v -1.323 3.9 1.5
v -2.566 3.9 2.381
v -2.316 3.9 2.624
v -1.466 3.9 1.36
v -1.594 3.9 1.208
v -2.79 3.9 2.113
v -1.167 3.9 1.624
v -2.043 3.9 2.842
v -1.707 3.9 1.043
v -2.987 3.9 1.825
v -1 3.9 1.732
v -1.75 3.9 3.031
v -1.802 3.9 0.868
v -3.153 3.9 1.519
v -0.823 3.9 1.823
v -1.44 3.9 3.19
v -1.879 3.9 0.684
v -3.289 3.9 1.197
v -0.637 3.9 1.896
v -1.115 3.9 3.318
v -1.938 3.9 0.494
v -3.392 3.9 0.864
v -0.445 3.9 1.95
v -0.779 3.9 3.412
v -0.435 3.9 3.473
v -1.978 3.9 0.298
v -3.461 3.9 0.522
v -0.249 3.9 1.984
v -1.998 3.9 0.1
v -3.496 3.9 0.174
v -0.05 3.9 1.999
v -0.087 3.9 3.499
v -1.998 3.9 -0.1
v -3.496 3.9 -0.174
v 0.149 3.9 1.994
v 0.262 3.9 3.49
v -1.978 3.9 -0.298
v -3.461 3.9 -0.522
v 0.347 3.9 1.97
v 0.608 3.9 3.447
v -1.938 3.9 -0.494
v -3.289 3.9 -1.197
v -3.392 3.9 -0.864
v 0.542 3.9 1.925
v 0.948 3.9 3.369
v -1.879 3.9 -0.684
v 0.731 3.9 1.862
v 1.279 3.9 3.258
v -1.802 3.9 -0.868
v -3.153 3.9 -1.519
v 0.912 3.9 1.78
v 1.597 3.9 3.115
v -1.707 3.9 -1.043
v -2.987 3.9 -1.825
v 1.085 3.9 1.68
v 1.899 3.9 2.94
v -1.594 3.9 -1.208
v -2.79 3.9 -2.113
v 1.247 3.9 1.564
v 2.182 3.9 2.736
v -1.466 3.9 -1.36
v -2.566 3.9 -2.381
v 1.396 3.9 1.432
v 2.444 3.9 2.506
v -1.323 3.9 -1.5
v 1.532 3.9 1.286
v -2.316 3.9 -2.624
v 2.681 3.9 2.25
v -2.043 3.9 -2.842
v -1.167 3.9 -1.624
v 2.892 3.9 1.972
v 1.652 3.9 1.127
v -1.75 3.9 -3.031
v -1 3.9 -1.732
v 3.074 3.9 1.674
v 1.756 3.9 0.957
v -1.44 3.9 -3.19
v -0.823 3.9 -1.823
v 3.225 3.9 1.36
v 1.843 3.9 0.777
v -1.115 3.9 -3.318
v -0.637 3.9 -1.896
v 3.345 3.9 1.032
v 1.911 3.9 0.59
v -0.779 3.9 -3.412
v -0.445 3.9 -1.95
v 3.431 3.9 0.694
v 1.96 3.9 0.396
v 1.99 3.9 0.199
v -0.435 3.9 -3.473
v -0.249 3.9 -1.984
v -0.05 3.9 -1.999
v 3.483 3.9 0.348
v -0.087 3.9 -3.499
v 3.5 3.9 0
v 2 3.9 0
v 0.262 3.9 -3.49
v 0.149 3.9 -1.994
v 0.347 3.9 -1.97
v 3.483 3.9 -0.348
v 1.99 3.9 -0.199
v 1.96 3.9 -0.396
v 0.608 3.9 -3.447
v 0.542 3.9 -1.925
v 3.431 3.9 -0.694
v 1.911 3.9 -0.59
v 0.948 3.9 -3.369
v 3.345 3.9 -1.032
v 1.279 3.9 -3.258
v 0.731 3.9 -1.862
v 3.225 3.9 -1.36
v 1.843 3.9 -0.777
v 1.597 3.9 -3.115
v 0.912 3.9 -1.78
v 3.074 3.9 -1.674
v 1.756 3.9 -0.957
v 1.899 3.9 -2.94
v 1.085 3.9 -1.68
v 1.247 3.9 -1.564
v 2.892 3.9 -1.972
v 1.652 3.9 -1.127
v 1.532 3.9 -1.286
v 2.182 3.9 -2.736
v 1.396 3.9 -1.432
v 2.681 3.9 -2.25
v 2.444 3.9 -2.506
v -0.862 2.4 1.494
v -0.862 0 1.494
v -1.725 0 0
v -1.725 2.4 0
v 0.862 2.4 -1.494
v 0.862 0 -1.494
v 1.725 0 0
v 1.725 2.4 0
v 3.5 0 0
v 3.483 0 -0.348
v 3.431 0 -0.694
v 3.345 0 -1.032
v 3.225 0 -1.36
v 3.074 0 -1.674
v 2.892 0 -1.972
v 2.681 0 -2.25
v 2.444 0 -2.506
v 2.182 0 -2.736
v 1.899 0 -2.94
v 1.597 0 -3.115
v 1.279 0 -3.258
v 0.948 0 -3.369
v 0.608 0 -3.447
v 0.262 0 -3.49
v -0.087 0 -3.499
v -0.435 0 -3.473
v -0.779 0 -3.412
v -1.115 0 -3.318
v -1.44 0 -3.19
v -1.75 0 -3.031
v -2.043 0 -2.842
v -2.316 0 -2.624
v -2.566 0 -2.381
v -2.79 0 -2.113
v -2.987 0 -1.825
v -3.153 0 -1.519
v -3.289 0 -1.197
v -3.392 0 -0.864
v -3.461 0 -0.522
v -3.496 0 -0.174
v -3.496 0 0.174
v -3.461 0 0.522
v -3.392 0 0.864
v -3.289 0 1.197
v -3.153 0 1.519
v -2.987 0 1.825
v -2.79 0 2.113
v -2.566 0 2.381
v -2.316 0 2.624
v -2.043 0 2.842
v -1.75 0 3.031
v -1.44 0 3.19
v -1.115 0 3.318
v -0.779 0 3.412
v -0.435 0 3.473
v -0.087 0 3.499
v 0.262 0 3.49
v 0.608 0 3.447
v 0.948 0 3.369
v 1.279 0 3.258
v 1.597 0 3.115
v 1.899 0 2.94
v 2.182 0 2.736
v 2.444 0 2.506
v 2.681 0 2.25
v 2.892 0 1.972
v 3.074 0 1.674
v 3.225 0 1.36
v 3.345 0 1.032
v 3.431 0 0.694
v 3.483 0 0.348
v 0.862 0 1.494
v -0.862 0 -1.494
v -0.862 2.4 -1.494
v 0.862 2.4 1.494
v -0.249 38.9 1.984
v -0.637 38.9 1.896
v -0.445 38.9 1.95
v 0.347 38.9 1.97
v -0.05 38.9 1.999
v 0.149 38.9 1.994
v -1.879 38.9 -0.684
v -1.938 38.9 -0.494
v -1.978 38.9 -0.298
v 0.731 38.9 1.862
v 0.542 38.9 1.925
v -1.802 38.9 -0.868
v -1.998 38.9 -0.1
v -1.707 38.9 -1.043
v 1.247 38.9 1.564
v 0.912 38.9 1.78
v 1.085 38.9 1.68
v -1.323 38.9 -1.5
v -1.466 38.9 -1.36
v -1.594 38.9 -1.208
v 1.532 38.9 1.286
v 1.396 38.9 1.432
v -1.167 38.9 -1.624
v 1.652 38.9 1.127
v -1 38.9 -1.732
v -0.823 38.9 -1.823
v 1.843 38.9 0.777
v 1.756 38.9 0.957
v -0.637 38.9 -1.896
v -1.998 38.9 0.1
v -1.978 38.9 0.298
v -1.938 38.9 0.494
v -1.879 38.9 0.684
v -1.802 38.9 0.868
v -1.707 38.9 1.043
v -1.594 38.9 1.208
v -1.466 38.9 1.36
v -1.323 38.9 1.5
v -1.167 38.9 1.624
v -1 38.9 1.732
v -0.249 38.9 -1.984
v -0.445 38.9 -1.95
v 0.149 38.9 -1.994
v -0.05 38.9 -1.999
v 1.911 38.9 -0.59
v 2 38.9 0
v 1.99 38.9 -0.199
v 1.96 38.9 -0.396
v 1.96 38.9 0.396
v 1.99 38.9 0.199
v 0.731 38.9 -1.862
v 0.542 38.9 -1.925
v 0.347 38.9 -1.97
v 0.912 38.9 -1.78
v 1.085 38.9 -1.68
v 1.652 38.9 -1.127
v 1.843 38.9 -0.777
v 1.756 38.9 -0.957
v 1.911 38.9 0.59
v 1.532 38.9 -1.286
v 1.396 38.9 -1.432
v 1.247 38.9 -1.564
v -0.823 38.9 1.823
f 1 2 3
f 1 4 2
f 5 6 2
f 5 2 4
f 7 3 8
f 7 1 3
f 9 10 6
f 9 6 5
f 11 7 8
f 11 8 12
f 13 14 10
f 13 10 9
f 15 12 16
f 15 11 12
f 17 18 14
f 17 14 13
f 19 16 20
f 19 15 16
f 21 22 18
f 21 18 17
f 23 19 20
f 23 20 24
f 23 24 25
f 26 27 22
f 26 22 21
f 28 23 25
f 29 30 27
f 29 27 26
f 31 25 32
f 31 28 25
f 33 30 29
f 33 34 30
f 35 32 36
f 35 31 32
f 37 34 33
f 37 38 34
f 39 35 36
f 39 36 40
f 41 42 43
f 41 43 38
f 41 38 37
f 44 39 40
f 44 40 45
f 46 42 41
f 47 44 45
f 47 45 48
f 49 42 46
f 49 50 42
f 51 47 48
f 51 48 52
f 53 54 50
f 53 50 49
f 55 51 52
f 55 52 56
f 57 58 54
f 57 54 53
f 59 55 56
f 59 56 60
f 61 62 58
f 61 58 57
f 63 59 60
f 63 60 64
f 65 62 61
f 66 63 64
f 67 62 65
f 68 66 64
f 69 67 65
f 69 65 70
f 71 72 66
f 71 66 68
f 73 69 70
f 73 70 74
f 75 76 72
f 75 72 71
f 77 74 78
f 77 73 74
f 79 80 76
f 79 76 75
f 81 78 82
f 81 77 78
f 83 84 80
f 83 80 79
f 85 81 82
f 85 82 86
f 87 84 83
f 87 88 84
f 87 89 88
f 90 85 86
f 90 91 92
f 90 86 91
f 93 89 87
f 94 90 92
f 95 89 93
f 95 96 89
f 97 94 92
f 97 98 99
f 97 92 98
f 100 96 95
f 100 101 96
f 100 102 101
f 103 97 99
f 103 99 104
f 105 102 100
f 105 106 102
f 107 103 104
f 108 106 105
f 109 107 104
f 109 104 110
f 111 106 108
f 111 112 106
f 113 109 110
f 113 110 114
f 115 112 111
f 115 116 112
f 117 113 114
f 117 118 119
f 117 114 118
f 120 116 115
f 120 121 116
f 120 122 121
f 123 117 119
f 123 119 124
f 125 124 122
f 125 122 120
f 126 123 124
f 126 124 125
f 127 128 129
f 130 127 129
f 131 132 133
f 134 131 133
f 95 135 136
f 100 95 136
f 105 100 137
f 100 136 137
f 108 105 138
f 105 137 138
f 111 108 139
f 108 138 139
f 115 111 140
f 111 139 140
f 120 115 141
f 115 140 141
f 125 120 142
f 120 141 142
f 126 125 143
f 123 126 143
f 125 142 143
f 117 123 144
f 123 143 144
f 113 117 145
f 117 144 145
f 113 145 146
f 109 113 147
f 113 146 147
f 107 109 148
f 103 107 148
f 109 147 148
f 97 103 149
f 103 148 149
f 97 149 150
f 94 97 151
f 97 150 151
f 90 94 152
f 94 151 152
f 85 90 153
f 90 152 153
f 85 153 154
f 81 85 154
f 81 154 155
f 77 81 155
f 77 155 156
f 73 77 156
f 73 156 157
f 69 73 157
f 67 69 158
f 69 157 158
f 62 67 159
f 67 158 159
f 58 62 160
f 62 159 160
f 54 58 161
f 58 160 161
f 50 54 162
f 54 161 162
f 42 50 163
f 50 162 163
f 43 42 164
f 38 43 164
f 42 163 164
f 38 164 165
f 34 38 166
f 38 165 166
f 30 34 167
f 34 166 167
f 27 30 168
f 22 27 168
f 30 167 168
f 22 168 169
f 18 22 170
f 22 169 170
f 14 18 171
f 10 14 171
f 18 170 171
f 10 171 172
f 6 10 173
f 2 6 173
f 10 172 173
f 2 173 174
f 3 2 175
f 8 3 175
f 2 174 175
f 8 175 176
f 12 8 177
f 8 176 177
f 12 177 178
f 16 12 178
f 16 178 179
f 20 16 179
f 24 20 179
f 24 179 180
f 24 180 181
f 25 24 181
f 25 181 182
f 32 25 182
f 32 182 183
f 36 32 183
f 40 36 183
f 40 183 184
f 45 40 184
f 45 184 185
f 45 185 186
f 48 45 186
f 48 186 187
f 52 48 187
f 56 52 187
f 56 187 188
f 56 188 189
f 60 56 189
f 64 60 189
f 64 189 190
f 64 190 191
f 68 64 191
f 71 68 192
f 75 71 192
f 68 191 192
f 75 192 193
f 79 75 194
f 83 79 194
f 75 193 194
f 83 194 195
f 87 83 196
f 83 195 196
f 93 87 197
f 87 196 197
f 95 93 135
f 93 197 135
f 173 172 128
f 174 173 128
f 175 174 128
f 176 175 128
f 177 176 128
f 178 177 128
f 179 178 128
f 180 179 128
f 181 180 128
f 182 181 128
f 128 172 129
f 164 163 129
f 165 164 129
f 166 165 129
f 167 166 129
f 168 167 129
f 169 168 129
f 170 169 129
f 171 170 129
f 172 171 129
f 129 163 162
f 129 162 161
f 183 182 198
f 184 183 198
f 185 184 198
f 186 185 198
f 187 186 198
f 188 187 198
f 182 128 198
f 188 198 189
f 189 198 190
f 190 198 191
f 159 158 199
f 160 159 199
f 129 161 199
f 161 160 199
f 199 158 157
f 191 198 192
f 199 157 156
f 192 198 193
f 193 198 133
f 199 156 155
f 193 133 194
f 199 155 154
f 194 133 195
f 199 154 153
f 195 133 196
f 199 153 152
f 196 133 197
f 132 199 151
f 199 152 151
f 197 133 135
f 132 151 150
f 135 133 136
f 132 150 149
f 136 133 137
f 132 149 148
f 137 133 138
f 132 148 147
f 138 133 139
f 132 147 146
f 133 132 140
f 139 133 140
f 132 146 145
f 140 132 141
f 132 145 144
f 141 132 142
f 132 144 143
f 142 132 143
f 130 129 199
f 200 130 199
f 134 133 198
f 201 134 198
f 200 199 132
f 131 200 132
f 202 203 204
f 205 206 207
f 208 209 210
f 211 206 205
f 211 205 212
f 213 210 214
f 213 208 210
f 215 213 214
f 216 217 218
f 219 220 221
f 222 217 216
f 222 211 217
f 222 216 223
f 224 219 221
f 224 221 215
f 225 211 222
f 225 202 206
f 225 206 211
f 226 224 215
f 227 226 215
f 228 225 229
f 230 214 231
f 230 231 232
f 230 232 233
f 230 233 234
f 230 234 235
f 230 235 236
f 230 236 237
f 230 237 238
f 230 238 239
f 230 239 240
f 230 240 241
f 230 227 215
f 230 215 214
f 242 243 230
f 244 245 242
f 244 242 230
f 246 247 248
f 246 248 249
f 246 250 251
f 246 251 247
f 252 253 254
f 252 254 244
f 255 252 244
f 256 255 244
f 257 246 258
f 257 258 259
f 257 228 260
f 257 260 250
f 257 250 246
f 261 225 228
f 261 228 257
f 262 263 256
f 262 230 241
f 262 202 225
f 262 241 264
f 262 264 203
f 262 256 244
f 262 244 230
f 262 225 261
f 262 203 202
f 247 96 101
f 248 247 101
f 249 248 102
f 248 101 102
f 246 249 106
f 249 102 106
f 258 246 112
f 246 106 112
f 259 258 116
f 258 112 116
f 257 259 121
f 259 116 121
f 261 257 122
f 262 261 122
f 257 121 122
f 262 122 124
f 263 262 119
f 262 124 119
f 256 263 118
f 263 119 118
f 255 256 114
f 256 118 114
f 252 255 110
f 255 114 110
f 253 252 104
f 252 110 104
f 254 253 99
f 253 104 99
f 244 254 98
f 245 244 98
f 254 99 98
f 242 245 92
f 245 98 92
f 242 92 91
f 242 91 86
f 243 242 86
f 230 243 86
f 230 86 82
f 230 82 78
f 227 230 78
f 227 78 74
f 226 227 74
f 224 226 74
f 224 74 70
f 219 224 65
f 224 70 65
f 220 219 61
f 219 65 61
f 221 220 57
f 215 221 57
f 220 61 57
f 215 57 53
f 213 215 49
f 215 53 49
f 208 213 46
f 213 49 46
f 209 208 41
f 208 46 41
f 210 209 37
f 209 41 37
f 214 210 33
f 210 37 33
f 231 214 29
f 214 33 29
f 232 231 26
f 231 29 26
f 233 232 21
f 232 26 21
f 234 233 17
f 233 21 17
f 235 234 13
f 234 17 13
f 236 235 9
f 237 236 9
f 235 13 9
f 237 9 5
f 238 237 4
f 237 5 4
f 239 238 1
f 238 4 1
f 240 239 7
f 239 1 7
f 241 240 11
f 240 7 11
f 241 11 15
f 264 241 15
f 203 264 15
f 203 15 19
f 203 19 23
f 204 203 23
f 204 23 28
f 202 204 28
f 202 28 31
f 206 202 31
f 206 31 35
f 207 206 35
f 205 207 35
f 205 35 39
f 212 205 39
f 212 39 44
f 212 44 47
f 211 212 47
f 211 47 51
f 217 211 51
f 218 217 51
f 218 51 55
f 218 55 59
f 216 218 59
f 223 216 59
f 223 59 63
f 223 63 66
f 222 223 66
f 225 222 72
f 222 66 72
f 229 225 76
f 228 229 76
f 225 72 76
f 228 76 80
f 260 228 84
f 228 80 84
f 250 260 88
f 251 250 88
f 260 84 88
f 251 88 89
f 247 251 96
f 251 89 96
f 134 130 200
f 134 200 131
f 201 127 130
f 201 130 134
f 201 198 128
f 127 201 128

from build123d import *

# Parameters (mm, degrees)
SKETCH_1_R          = 3.5
EXTRUDE_1_DEPTH     = 3.9
SKETCH_2_R          = 2
EXTRUDE_2_DEPTH     = 35
CUT_EXTRUDE_1_DEPTH = 2.4


with BuildPart() as part:
    # 草图1 → 凸台-拉伸1 (new body)
    with BuildSketch(Plane(origin=(0, 0, 0), x_dir=(1, 0, 0), z_dir=(0, 1, 0))):
        Circle(SKETCH_1_R)
    extrude(amount=EXTRUDE_1_DEPTH)

    # 草图2 → 凸台-拉伸2 (add)
    with BuildSketch(Plane(origin=(0, 3.9, 0), x_dir=(1, 0, 0), z_dir=(0, 1, 0))):
        Circle(SKETCH_2_R)
    extrude(amount=EXTRUDE_2_DEPTH)

    # 草图3 → 切除-拉伸1 (cut)
    with BuildSketch(Plane.XZ):
        Polygon((1.725, 0), (0.8625, 1.493893822), (-0.8625, 1.493893822), (-1.725, 0), (-0.8625, -1.493893822), (0.8625, -1.493893822), align=None)
    extrude(amount=-CUT_EXTRUDE_1_DEPTH, mode=Mode.SUBTRACT)


solid = part.part
